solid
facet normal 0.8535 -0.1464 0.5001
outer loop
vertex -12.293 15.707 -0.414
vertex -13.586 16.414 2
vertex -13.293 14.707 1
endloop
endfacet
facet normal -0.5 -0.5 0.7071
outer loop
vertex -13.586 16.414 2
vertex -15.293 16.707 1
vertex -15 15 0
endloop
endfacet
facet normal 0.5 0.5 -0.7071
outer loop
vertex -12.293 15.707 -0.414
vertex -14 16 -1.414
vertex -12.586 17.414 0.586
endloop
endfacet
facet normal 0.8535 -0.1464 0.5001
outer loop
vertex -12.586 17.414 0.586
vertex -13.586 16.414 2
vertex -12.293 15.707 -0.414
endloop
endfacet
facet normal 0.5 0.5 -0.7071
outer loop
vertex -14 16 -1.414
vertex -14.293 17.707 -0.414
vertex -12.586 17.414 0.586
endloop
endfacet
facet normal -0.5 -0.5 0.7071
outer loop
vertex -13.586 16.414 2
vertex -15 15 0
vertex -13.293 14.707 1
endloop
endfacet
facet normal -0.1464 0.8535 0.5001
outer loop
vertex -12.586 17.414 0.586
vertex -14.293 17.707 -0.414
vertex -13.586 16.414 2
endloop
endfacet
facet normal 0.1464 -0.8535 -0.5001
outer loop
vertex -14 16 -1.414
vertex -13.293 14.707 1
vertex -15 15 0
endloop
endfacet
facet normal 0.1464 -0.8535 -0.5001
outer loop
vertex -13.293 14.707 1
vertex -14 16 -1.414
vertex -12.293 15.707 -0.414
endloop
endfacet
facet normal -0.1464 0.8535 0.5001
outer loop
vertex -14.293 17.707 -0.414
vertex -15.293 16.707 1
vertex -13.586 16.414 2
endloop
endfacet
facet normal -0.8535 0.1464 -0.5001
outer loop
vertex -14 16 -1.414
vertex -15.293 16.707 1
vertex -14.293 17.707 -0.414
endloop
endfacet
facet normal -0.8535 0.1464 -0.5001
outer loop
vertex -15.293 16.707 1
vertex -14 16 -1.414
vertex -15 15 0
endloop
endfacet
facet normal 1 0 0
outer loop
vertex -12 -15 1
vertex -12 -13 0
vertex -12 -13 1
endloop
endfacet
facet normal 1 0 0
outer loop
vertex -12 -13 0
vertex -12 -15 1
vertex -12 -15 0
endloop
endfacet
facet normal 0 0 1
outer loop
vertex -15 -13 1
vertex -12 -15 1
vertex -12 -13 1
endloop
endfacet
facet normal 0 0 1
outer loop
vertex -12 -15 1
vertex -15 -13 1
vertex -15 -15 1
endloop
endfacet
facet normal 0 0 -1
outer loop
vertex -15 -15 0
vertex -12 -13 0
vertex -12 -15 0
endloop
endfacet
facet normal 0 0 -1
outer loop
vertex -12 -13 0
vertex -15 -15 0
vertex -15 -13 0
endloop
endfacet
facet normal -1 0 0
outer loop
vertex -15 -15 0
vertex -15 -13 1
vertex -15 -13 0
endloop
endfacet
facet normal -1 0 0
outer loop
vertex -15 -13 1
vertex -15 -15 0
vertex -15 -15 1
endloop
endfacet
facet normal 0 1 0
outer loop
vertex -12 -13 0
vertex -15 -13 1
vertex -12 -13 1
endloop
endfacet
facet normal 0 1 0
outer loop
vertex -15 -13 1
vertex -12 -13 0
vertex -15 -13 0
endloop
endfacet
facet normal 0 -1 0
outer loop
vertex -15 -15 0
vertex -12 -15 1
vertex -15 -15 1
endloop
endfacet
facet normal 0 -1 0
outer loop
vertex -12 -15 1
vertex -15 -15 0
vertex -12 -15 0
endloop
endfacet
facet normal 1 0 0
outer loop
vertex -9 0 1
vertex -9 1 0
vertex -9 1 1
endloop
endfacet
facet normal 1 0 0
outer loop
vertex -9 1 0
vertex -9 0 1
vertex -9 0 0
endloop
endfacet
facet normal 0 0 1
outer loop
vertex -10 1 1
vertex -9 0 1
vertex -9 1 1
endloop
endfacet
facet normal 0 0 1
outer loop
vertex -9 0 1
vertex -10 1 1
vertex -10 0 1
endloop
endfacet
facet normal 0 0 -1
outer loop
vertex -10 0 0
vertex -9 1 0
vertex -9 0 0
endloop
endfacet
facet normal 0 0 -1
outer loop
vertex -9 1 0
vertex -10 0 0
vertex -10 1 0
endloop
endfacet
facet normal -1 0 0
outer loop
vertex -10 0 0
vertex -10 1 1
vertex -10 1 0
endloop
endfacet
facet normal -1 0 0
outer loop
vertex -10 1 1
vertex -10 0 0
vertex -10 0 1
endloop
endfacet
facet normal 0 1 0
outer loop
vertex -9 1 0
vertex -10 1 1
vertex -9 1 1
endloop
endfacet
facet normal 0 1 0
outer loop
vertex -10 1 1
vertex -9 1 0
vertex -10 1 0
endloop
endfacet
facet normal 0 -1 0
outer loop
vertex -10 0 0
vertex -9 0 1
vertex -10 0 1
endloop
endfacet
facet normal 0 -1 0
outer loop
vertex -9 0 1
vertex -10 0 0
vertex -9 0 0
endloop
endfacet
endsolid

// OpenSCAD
// Copyright Stephen Morrisson 2018
// All rights reserved

module myCube(c, xO, yO, zO, xS, yS, zS)
{
    color(c)
    translate([xO, yO, zO])
    cube([xS, yS, zS]);
}



// {xyz, rot, trans, tr} Cube

module xyzCube(c, x, y, z)
{
    color(c) cube([x, y, z], false);
}

module rotCube(c, rotX, rotY, rotZ, x, y, z)
{
    rotate([rotX, rotY, rotZ]) xyzCube(c, x, y, z);
}
translate([-15, 15, 0,])rotCube("green", 45, 45, 45, 2,2,2);

module transCube(c, xOffset, yOffset, zOffset, x, y, z)
{
    translate([xOffset, yOffset, zOffset]) xyzCube(c, x, y, z);
}
transCube("brown", -15, -15, 0, 3, 2, 1);


module trCube(c, rotX, rotY, rotZ, xO, yO, zO, x, y, z)
{
    translate([xO, yO, zO])
    rotate([rotX, rotY, rotZ])
    xyzCube(c, x, y, z);
}
//trCube("yellow", 0,0,0, 0,0,0, 2, 3, 4);
//trCube("green", 45, 45, 45, 4, 3, 1, 5, 6, 7);
//trCube("blue", 0, 0, 45, 20, 0, 0, 5, 6, 7);
trCube("orange", 0,0,0, -10, 0, 0, 1,1,1);
//trCube("orange", 45,0,0, -15, 0, 0, 1,1,1);
//trCube("orange", 0,45,0, -20, 0, 0, 1,1,1);
//trCube("orange", 0,0,45, -25, 0, 0, 1,1,1);
